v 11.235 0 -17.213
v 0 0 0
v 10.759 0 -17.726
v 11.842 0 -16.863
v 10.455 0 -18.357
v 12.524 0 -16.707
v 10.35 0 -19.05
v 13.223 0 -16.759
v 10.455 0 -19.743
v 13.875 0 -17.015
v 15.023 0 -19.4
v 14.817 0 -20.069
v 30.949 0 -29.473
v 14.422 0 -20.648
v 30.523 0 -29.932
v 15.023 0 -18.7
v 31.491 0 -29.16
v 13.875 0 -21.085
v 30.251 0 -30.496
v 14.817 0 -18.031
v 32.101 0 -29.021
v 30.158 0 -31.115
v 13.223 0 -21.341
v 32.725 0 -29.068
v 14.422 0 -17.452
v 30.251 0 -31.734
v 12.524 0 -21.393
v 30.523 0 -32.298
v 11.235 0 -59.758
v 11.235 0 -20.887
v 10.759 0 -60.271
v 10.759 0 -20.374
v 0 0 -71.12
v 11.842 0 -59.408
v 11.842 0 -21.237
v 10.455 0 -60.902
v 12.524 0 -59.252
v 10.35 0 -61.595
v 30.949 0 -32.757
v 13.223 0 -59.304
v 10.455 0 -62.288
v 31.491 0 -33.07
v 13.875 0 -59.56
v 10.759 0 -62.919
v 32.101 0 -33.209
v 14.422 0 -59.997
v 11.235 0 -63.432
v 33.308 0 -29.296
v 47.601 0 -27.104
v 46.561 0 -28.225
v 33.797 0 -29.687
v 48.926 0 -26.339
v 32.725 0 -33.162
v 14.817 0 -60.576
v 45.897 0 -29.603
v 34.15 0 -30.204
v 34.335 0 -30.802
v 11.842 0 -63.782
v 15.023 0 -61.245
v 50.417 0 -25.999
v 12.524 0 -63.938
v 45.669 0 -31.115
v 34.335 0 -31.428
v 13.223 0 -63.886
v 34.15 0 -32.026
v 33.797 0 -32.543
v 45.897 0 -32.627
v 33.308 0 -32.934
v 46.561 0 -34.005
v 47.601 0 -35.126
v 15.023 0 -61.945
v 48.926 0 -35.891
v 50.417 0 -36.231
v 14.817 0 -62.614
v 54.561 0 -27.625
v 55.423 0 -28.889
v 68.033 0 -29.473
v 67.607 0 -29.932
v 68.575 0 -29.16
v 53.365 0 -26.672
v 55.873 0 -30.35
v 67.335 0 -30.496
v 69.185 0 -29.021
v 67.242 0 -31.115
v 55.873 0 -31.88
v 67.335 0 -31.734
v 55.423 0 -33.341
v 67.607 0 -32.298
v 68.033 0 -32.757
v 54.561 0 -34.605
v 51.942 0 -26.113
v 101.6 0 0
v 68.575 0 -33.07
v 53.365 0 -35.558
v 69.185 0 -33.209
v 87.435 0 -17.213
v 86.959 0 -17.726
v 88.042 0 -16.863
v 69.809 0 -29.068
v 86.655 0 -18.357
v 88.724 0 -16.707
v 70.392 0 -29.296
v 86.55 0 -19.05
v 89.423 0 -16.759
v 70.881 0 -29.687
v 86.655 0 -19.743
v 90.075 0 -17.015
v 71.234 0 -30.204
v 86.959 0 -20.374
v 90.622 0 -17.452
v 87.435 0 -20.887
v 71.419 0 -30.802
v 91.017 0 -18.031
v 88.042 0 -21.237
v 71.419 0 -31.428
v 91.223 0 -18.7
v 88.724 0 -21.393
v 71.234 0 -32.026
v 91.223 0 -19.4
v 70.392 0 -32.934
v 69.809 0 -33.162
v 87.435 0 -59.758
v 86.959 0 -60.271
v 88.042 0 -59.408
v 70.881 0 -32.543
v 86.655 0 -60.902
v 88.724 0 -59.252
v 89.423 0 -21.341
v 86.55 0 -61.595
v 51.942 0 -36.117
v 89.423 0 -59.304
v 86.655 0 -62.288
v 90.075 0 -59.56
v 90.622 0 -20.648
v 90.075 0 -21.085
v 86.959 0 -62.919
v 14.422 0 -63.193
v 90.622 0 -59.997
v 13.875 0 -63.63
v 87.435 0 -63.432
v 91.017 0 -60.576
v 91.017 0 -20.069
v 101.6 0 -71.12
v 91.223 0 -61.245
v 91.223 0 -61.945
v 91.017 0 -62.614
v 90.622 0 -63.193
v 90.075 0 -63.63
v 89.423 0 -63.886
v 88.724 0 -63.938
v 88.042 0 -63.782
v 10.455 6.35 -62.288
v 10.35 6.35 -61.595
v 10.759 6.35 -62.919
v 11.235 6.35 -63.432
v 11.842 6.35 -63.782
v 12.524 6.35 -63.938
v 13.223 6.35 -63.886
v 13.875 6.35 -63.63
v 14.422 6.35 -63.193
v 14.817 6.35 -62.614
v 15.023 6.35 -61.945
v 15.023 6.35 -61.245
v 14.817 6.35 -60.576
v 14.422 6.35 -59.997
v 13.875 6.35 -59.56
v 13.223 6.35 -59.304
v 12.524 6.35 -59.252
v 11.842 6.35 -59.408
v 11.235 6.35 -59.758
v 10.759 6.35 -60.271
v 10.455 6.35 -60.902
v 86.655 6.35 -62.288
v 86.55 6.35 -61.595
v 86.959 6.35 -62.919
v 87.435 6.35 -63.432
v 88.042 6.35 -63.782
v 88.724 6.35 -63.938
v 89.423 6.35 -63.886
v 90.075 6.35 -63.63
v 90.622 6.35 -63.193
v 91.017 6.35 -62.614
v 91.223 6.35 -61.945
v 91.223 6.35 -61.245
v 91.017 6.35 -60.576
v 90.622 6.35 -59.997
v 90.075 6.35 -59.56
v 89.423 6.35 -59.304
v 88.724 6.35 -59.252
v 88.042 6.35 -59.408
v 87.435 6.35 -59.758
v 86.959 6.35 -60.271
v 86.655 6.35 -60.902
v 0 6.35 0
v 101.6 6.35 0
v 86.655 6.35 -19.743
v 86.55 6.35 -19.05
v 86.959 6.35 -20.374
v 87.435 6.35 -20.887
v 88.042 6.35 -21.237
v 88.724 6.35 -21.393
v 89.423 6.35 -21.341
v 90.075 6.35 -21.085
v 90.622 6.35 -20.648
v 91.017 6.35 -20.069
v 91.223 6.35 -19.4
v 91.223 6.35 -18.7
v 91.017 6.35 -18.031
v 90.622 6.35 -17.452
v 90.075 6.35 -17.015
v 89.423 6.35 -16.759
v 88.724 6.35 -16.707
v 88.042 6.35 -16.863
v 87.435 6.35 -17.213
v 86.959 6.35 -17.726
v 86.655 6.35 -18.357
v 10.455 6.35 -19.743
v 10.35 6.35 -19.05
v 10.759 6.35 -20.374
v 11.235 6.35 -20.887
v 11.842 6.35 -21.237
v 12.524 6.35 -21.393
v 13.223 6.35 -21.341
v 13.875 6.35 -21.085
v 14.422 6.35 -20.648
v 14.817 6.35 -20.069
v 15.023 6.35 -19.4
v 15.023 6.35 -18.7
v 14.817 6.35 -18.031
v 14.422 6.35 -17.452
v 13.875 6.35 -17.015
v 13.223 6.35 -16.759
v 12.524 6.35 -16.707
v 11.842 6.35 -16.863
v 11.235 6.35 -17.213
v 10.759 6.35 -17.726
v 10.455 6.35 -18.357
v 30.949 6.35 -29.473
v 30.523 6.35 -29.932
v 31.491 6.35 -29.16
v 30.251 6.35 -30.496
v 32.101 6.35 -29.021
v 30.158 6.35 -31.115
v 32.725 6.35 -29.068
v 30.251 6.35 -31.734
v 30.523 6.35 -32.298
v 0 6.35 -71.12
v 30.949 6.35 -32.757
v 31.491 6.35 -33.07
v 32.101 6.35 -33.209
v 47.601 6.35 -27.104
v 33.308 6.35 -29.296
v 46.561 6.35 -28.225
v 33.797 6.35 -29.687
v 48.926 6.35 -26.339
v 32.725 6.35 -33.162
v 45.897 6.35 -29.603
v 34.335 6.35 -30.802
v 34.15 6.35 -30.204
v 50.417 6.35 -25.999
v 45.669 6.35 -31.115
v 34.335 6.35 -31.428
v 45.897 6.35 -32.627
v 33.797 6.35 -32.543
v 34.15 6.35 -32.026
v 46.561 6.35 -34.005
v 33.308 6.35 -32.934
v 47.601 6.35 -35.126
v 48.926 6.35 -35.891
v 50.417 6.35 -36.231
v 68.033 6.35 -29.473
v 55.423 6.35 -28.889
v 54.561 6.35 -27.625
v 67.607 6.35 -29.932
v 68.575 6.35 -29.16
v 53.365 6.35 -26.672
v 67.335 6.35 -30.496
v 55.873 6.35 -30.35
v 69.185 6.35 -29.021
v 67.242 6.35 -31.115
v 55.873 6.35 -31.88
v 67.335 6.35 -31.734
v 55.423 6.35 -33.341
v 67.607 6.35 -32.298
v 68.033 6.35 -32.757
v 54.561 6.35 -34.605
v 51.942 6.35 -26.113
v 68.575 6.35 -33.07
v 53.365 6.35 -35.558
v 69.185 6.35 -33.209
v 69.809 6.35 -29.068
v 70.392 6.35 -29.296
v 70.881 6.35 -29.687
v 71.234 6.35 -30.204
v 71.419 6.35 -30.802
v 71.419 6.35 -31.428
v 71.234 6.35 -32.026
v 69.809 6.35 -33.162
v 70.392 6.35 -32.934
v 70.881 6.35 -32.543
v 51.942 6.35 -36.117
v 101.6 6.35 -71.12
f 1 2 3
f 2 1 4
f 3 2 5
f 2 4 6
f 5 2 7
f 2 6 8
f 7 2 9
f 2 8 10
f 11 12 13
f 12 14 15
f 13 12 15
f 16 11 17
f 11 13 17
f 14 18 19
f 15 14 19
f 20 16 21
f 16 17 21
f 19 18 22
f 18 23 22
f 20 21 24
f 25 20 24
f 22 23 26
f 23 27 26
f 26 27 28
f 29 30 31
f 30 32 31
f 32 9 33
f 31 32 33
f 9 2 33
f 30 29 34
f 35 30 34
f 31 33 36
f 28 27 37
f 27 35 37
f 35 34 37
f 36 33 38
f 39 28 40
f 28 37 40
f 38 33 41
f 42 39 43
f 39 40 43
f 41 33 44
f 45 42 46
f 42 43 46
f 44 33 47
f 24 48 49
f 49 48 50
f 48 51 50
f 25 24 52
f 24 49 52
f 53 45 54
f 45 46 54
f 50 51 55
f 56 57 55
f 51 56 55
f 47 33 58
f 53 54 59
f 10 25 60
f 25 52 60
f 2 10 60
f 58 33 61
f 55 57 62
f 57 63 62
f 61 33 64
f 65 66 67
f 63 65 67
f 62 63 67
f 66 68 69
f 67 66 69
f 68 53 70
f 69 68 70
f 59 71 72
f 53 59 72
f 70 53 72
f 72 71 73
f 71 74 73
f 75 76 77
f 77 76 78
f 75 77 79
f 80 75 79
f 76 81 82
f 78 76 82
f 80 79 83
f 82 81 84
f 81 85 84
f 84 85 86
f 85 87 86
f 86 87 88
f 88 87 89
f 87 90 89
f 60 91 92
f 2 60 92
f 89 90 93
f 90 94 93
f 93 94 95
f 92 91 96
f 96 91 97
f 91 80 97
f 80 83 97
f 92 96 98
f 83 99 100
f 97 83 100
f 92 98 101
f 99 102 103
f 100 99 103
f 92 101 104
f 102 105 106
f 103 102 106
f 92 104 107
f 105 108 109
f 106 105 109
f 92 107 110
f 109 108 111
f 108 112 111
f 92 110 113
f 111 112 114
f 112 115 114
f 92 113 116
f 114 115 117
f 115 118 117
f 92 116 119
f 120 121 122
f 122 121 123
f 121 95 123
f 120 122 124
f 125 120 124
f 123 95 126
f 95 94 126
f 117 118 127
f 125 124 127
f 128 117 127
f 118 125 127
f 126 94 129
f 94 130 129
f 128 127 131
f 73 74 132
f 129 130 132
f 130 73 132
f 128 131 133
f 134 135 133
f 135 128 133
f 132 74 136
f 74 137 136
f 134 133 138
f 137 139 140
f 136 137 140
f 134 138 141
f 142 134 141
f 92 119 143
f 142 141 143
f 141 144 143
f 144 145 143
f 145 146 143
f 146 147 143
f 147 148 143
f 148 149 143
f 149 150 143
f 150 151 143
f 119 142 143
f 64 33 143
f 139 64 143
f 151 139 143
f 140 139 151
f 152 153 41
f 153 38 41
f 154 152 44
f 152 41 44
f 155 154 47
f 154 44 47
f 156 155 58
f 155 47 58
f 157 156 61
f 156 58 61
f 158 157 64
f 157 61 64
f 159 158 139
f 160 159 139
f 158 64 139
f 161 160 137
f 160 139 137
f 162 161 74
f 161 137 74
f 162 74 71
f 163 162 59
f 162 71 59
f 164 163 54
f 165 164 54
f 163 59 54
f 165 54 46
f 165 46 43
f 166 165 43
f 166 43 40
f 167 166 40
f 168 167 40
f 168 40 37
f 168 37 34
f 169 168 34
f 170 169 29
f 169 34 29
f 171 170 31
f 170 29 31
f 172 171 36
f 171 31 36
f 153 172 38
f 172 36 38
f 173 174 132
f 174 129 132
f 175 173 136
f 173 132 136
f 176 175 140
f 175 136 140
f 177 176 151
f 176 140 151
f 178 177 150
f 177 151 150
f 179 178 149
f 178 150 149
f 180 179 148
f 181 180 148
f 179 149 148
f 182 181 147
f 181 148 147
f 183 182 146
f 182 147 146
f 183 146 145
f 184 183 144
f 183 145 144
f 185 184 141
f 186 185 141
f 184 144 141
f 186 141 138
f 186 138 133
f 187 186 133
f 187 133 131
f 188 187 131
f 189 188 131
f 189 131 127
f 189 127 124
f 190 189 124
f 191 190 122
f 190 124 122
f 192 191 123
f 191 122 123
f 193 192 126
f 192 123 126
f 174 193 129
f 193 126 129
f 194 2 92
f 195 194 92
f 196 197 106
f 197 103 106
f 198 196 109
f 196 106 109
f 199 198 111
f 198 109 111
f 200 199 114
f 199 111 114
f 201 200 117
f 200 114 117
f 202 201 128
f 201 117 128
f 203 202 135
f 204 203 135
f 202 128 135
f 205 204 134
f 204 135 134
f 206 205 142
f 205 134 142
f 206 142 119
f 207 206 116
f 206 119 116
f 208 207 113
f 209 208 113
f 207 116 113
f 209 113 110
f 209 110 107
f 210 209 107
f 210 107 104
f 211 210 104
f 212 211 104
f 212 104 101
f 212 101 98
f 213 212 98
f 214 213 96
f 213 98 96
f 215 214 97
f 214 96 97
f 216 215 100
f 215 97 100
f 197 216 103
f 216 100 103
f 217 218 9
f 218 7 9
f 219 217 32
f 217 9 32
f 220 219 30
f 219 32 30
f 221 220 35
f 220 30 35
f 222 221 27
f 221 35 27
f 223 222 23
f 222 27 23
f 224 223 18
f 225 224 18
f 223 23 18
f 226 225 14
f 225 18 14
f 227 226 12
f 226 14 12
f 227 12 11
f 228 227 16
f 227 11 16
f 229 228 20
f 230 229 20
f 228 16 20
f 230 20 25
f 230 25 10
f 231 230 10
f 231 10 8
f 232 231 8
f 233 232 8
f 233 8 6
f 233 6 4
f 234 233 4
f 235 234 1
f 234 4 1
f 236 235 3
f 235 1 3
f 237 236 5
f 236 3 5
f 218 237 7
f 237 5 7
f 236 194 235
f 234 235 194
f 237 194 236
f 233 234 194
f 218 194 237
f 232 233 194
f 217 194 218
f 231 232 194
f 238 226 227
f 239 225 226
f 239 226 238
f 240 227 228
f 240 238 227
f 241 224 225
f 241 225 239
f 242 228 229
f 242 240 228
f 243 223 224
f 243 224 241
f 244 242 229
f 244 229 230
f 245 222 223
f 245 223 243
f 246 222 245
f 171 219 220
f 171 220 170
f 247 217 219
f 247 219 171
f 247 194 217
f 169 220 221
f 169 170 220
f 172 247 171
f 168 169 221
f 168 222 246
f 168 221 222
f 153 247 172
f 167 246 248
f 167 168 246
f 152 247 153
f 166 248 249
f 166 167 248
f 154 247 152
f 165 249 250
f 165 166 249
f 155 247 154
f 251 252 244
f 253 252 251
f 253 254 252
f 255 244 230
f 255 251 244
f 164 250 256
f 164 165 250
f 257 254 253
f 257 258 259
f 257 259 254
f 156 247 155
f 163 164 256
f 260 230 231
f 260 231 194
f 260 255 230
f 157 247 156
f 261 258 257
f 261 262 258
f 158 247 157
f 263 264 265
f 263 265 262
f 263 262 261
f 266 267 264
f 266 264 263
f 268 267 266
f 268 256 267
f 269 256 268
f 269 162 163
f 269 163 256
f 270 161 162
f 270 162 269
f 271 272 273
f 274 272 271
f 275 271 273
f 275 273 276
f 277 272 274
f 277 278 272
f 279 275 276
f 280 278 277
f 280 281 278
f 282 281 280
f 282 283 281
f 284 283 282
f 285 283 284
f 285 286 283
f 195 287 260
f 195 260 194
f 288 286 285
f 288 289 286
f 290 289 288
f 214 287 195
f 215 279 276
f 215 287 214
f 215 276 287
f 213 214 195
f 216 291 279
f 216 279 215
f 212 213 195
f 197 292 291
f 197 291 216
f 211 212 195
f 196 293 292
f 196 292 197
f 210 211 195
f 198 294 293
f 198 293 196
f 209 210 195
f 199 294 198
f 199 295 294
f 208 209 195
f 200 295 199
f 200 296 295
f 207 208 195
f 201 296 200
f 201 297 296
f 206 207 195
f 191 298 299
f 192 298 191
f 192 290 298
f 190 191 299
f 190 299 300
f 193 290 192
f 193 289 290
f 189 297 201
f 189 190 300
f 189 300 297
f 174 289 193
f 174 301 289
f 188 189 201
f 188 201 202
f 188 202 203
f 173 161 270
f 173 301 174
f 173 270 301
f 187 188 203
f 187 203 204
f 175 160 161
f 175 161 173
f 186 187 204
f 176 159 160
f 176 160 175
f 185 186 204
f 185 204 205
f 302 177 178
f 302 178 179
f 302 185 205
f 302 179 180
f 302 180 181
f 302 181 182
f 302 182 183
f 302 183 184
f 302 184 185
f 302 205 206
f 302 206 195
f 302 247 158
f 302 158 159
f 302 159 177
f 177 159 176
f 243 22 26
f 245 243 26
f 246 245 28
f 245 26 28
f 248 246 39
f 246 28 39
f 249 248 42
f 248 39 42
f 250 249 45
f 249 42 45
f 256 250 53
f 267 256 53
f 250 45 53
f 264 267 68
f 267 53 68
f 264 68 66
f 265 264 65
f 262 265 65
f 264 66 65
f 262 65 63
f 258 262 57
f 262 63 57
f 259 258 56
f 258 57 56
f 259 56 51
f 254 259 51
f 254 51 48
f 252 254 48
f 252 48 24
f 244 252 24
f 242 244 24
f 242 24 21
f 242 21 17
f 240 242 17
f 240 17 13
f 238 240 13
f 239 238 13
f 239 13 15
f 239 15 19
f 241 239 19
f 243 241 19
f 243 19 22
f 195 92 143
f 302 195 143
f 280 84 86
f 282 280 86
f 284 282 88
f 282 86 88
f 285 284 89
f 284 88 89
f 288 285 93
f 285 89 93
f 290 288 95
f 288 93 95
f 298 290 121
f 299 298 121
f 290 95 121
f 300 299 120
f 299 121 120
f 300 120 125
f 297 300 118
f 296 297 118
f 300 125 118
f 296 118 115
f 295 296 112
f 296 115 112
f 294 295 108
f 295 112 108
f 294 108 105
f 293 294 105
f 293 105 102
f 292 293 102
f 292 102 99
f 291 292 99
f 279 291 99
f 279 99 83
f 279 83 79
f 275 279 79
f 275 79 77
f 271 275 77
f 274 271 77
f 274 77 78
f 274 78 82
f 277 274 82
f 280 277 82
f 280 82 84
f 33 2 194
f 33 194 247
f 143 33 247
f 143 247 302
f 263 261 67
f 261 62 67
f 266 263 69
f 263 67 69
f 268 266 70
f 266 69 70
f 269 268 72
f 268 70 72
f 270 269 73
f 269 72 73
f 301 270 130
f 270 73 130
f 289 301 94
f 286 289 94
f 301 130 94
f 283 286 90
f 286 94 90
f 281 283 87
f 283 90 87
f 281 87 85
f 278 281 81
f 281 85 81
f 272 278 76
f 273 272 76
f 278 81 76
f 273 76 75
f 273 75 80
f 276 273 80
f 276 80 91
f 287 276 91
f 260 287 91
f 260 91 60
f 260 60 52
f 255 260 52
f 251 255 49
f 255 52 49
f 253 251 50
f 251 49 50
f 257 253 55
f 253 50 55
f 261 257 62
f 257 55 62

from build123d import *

# Parameters (mm, degrees)
SKETCH1_W                       = 101.6
SKETCH1_H                       = 71.12
BASE_DEPTH                      = 6.35
WOODSCREW_CLEARANCE_HOLES_D     = 4.699
WOODSCREW_CLEARANCE_HOLES_DEPTH = 6.35
WOODSCREW_CLEARANCE_HOLES_TIP   = 1.411722024
SHAFT_CLEARANCE_HOLE_D          = 10.2616
SHAFT_CLEARANCE_HOLE_DEPTH      = 6.35
SHAFT_CLEARANCE_HOLE_TIP        = 3.082895664
M5X0_8_TAPPED_HOLE1_D           = 4.2


with BuildPart() as part:
    # Sketch1 → base (new body)
    with BuildSketch(Plane(origin=(0, 0, 0), x_dir=(1, 0, 0), z_dir=(0, 1, 0))):
        with Locations((50.8, 35.56)):
            Rectangle(SKETCH1_W, SKETCH1_H)
    extrude(amount=BASE_DEPTH)

    # woodscrew clearance holes
    with Locations(Plane(origin=(0, 6.35, 0), x_dir=(1, 0, 0), z_dir=(0, 1, 0))):
        with Locations((12.7, 61.595), (88.9, 61.595), (88.9, 19.05), (12.7, 19.05)):
            Hole(WOODSCREW_CLEARANCE_HOLES_D / 2, depth=WOODSCREW_CLEARANCE_HOLES_DEPTH)
            with Locations((0, 0, -(WOODSCREW_CLEARANCE_HOLES_DEPTH + WOODSCREW_CLEARANCE_HOLES_TIP / 2))):  # 118° drill point
                Cone(0, WOODSCREW_CLEARANCE_HOLES_D / 2, WOODSCREW_CLEARANCE_HOLES_TIP, mode=Mode.SUBTRACT)

    # shaft clearance hole
    with Locations(Plane(origin=(0, 6.35, 0), x_dir=(1, 0, 0), z_dir=(0, 1, 0))):
        with Locations((50.8, 31.115)):
            Hole(SHAFT_CLEARANCE_HOLE_D / 2, depth=SHAFT_CLEARANCE_HOLE_DEPTH)
            with Locations((0, 0, -(SHAFT_CLEARANCE_HOLE_DEPTH + SHAFT_CLEARANCE_HOLE_TIP / 2))):  # 118° drill point
                Cone(0, SHAFT_CLEARANCE_HOLE_D / 2, SHAFT_CLEARANCE_HOLE_TIP, mode=Mode.SUBTRACT)

    # M5x0.8 Tapped Hole1 (through all)
    with Locations(Plane(origin=(0, 6.35, 0), x_dir=(1, 0, 0), z_dir=(0, 1, 0))):
        with Locations((32.258, 31.115), (69.342, 31.115)):
            Hole(M5X0_8_TAPPED_HOLE1_D / 2)


solid = part.part
